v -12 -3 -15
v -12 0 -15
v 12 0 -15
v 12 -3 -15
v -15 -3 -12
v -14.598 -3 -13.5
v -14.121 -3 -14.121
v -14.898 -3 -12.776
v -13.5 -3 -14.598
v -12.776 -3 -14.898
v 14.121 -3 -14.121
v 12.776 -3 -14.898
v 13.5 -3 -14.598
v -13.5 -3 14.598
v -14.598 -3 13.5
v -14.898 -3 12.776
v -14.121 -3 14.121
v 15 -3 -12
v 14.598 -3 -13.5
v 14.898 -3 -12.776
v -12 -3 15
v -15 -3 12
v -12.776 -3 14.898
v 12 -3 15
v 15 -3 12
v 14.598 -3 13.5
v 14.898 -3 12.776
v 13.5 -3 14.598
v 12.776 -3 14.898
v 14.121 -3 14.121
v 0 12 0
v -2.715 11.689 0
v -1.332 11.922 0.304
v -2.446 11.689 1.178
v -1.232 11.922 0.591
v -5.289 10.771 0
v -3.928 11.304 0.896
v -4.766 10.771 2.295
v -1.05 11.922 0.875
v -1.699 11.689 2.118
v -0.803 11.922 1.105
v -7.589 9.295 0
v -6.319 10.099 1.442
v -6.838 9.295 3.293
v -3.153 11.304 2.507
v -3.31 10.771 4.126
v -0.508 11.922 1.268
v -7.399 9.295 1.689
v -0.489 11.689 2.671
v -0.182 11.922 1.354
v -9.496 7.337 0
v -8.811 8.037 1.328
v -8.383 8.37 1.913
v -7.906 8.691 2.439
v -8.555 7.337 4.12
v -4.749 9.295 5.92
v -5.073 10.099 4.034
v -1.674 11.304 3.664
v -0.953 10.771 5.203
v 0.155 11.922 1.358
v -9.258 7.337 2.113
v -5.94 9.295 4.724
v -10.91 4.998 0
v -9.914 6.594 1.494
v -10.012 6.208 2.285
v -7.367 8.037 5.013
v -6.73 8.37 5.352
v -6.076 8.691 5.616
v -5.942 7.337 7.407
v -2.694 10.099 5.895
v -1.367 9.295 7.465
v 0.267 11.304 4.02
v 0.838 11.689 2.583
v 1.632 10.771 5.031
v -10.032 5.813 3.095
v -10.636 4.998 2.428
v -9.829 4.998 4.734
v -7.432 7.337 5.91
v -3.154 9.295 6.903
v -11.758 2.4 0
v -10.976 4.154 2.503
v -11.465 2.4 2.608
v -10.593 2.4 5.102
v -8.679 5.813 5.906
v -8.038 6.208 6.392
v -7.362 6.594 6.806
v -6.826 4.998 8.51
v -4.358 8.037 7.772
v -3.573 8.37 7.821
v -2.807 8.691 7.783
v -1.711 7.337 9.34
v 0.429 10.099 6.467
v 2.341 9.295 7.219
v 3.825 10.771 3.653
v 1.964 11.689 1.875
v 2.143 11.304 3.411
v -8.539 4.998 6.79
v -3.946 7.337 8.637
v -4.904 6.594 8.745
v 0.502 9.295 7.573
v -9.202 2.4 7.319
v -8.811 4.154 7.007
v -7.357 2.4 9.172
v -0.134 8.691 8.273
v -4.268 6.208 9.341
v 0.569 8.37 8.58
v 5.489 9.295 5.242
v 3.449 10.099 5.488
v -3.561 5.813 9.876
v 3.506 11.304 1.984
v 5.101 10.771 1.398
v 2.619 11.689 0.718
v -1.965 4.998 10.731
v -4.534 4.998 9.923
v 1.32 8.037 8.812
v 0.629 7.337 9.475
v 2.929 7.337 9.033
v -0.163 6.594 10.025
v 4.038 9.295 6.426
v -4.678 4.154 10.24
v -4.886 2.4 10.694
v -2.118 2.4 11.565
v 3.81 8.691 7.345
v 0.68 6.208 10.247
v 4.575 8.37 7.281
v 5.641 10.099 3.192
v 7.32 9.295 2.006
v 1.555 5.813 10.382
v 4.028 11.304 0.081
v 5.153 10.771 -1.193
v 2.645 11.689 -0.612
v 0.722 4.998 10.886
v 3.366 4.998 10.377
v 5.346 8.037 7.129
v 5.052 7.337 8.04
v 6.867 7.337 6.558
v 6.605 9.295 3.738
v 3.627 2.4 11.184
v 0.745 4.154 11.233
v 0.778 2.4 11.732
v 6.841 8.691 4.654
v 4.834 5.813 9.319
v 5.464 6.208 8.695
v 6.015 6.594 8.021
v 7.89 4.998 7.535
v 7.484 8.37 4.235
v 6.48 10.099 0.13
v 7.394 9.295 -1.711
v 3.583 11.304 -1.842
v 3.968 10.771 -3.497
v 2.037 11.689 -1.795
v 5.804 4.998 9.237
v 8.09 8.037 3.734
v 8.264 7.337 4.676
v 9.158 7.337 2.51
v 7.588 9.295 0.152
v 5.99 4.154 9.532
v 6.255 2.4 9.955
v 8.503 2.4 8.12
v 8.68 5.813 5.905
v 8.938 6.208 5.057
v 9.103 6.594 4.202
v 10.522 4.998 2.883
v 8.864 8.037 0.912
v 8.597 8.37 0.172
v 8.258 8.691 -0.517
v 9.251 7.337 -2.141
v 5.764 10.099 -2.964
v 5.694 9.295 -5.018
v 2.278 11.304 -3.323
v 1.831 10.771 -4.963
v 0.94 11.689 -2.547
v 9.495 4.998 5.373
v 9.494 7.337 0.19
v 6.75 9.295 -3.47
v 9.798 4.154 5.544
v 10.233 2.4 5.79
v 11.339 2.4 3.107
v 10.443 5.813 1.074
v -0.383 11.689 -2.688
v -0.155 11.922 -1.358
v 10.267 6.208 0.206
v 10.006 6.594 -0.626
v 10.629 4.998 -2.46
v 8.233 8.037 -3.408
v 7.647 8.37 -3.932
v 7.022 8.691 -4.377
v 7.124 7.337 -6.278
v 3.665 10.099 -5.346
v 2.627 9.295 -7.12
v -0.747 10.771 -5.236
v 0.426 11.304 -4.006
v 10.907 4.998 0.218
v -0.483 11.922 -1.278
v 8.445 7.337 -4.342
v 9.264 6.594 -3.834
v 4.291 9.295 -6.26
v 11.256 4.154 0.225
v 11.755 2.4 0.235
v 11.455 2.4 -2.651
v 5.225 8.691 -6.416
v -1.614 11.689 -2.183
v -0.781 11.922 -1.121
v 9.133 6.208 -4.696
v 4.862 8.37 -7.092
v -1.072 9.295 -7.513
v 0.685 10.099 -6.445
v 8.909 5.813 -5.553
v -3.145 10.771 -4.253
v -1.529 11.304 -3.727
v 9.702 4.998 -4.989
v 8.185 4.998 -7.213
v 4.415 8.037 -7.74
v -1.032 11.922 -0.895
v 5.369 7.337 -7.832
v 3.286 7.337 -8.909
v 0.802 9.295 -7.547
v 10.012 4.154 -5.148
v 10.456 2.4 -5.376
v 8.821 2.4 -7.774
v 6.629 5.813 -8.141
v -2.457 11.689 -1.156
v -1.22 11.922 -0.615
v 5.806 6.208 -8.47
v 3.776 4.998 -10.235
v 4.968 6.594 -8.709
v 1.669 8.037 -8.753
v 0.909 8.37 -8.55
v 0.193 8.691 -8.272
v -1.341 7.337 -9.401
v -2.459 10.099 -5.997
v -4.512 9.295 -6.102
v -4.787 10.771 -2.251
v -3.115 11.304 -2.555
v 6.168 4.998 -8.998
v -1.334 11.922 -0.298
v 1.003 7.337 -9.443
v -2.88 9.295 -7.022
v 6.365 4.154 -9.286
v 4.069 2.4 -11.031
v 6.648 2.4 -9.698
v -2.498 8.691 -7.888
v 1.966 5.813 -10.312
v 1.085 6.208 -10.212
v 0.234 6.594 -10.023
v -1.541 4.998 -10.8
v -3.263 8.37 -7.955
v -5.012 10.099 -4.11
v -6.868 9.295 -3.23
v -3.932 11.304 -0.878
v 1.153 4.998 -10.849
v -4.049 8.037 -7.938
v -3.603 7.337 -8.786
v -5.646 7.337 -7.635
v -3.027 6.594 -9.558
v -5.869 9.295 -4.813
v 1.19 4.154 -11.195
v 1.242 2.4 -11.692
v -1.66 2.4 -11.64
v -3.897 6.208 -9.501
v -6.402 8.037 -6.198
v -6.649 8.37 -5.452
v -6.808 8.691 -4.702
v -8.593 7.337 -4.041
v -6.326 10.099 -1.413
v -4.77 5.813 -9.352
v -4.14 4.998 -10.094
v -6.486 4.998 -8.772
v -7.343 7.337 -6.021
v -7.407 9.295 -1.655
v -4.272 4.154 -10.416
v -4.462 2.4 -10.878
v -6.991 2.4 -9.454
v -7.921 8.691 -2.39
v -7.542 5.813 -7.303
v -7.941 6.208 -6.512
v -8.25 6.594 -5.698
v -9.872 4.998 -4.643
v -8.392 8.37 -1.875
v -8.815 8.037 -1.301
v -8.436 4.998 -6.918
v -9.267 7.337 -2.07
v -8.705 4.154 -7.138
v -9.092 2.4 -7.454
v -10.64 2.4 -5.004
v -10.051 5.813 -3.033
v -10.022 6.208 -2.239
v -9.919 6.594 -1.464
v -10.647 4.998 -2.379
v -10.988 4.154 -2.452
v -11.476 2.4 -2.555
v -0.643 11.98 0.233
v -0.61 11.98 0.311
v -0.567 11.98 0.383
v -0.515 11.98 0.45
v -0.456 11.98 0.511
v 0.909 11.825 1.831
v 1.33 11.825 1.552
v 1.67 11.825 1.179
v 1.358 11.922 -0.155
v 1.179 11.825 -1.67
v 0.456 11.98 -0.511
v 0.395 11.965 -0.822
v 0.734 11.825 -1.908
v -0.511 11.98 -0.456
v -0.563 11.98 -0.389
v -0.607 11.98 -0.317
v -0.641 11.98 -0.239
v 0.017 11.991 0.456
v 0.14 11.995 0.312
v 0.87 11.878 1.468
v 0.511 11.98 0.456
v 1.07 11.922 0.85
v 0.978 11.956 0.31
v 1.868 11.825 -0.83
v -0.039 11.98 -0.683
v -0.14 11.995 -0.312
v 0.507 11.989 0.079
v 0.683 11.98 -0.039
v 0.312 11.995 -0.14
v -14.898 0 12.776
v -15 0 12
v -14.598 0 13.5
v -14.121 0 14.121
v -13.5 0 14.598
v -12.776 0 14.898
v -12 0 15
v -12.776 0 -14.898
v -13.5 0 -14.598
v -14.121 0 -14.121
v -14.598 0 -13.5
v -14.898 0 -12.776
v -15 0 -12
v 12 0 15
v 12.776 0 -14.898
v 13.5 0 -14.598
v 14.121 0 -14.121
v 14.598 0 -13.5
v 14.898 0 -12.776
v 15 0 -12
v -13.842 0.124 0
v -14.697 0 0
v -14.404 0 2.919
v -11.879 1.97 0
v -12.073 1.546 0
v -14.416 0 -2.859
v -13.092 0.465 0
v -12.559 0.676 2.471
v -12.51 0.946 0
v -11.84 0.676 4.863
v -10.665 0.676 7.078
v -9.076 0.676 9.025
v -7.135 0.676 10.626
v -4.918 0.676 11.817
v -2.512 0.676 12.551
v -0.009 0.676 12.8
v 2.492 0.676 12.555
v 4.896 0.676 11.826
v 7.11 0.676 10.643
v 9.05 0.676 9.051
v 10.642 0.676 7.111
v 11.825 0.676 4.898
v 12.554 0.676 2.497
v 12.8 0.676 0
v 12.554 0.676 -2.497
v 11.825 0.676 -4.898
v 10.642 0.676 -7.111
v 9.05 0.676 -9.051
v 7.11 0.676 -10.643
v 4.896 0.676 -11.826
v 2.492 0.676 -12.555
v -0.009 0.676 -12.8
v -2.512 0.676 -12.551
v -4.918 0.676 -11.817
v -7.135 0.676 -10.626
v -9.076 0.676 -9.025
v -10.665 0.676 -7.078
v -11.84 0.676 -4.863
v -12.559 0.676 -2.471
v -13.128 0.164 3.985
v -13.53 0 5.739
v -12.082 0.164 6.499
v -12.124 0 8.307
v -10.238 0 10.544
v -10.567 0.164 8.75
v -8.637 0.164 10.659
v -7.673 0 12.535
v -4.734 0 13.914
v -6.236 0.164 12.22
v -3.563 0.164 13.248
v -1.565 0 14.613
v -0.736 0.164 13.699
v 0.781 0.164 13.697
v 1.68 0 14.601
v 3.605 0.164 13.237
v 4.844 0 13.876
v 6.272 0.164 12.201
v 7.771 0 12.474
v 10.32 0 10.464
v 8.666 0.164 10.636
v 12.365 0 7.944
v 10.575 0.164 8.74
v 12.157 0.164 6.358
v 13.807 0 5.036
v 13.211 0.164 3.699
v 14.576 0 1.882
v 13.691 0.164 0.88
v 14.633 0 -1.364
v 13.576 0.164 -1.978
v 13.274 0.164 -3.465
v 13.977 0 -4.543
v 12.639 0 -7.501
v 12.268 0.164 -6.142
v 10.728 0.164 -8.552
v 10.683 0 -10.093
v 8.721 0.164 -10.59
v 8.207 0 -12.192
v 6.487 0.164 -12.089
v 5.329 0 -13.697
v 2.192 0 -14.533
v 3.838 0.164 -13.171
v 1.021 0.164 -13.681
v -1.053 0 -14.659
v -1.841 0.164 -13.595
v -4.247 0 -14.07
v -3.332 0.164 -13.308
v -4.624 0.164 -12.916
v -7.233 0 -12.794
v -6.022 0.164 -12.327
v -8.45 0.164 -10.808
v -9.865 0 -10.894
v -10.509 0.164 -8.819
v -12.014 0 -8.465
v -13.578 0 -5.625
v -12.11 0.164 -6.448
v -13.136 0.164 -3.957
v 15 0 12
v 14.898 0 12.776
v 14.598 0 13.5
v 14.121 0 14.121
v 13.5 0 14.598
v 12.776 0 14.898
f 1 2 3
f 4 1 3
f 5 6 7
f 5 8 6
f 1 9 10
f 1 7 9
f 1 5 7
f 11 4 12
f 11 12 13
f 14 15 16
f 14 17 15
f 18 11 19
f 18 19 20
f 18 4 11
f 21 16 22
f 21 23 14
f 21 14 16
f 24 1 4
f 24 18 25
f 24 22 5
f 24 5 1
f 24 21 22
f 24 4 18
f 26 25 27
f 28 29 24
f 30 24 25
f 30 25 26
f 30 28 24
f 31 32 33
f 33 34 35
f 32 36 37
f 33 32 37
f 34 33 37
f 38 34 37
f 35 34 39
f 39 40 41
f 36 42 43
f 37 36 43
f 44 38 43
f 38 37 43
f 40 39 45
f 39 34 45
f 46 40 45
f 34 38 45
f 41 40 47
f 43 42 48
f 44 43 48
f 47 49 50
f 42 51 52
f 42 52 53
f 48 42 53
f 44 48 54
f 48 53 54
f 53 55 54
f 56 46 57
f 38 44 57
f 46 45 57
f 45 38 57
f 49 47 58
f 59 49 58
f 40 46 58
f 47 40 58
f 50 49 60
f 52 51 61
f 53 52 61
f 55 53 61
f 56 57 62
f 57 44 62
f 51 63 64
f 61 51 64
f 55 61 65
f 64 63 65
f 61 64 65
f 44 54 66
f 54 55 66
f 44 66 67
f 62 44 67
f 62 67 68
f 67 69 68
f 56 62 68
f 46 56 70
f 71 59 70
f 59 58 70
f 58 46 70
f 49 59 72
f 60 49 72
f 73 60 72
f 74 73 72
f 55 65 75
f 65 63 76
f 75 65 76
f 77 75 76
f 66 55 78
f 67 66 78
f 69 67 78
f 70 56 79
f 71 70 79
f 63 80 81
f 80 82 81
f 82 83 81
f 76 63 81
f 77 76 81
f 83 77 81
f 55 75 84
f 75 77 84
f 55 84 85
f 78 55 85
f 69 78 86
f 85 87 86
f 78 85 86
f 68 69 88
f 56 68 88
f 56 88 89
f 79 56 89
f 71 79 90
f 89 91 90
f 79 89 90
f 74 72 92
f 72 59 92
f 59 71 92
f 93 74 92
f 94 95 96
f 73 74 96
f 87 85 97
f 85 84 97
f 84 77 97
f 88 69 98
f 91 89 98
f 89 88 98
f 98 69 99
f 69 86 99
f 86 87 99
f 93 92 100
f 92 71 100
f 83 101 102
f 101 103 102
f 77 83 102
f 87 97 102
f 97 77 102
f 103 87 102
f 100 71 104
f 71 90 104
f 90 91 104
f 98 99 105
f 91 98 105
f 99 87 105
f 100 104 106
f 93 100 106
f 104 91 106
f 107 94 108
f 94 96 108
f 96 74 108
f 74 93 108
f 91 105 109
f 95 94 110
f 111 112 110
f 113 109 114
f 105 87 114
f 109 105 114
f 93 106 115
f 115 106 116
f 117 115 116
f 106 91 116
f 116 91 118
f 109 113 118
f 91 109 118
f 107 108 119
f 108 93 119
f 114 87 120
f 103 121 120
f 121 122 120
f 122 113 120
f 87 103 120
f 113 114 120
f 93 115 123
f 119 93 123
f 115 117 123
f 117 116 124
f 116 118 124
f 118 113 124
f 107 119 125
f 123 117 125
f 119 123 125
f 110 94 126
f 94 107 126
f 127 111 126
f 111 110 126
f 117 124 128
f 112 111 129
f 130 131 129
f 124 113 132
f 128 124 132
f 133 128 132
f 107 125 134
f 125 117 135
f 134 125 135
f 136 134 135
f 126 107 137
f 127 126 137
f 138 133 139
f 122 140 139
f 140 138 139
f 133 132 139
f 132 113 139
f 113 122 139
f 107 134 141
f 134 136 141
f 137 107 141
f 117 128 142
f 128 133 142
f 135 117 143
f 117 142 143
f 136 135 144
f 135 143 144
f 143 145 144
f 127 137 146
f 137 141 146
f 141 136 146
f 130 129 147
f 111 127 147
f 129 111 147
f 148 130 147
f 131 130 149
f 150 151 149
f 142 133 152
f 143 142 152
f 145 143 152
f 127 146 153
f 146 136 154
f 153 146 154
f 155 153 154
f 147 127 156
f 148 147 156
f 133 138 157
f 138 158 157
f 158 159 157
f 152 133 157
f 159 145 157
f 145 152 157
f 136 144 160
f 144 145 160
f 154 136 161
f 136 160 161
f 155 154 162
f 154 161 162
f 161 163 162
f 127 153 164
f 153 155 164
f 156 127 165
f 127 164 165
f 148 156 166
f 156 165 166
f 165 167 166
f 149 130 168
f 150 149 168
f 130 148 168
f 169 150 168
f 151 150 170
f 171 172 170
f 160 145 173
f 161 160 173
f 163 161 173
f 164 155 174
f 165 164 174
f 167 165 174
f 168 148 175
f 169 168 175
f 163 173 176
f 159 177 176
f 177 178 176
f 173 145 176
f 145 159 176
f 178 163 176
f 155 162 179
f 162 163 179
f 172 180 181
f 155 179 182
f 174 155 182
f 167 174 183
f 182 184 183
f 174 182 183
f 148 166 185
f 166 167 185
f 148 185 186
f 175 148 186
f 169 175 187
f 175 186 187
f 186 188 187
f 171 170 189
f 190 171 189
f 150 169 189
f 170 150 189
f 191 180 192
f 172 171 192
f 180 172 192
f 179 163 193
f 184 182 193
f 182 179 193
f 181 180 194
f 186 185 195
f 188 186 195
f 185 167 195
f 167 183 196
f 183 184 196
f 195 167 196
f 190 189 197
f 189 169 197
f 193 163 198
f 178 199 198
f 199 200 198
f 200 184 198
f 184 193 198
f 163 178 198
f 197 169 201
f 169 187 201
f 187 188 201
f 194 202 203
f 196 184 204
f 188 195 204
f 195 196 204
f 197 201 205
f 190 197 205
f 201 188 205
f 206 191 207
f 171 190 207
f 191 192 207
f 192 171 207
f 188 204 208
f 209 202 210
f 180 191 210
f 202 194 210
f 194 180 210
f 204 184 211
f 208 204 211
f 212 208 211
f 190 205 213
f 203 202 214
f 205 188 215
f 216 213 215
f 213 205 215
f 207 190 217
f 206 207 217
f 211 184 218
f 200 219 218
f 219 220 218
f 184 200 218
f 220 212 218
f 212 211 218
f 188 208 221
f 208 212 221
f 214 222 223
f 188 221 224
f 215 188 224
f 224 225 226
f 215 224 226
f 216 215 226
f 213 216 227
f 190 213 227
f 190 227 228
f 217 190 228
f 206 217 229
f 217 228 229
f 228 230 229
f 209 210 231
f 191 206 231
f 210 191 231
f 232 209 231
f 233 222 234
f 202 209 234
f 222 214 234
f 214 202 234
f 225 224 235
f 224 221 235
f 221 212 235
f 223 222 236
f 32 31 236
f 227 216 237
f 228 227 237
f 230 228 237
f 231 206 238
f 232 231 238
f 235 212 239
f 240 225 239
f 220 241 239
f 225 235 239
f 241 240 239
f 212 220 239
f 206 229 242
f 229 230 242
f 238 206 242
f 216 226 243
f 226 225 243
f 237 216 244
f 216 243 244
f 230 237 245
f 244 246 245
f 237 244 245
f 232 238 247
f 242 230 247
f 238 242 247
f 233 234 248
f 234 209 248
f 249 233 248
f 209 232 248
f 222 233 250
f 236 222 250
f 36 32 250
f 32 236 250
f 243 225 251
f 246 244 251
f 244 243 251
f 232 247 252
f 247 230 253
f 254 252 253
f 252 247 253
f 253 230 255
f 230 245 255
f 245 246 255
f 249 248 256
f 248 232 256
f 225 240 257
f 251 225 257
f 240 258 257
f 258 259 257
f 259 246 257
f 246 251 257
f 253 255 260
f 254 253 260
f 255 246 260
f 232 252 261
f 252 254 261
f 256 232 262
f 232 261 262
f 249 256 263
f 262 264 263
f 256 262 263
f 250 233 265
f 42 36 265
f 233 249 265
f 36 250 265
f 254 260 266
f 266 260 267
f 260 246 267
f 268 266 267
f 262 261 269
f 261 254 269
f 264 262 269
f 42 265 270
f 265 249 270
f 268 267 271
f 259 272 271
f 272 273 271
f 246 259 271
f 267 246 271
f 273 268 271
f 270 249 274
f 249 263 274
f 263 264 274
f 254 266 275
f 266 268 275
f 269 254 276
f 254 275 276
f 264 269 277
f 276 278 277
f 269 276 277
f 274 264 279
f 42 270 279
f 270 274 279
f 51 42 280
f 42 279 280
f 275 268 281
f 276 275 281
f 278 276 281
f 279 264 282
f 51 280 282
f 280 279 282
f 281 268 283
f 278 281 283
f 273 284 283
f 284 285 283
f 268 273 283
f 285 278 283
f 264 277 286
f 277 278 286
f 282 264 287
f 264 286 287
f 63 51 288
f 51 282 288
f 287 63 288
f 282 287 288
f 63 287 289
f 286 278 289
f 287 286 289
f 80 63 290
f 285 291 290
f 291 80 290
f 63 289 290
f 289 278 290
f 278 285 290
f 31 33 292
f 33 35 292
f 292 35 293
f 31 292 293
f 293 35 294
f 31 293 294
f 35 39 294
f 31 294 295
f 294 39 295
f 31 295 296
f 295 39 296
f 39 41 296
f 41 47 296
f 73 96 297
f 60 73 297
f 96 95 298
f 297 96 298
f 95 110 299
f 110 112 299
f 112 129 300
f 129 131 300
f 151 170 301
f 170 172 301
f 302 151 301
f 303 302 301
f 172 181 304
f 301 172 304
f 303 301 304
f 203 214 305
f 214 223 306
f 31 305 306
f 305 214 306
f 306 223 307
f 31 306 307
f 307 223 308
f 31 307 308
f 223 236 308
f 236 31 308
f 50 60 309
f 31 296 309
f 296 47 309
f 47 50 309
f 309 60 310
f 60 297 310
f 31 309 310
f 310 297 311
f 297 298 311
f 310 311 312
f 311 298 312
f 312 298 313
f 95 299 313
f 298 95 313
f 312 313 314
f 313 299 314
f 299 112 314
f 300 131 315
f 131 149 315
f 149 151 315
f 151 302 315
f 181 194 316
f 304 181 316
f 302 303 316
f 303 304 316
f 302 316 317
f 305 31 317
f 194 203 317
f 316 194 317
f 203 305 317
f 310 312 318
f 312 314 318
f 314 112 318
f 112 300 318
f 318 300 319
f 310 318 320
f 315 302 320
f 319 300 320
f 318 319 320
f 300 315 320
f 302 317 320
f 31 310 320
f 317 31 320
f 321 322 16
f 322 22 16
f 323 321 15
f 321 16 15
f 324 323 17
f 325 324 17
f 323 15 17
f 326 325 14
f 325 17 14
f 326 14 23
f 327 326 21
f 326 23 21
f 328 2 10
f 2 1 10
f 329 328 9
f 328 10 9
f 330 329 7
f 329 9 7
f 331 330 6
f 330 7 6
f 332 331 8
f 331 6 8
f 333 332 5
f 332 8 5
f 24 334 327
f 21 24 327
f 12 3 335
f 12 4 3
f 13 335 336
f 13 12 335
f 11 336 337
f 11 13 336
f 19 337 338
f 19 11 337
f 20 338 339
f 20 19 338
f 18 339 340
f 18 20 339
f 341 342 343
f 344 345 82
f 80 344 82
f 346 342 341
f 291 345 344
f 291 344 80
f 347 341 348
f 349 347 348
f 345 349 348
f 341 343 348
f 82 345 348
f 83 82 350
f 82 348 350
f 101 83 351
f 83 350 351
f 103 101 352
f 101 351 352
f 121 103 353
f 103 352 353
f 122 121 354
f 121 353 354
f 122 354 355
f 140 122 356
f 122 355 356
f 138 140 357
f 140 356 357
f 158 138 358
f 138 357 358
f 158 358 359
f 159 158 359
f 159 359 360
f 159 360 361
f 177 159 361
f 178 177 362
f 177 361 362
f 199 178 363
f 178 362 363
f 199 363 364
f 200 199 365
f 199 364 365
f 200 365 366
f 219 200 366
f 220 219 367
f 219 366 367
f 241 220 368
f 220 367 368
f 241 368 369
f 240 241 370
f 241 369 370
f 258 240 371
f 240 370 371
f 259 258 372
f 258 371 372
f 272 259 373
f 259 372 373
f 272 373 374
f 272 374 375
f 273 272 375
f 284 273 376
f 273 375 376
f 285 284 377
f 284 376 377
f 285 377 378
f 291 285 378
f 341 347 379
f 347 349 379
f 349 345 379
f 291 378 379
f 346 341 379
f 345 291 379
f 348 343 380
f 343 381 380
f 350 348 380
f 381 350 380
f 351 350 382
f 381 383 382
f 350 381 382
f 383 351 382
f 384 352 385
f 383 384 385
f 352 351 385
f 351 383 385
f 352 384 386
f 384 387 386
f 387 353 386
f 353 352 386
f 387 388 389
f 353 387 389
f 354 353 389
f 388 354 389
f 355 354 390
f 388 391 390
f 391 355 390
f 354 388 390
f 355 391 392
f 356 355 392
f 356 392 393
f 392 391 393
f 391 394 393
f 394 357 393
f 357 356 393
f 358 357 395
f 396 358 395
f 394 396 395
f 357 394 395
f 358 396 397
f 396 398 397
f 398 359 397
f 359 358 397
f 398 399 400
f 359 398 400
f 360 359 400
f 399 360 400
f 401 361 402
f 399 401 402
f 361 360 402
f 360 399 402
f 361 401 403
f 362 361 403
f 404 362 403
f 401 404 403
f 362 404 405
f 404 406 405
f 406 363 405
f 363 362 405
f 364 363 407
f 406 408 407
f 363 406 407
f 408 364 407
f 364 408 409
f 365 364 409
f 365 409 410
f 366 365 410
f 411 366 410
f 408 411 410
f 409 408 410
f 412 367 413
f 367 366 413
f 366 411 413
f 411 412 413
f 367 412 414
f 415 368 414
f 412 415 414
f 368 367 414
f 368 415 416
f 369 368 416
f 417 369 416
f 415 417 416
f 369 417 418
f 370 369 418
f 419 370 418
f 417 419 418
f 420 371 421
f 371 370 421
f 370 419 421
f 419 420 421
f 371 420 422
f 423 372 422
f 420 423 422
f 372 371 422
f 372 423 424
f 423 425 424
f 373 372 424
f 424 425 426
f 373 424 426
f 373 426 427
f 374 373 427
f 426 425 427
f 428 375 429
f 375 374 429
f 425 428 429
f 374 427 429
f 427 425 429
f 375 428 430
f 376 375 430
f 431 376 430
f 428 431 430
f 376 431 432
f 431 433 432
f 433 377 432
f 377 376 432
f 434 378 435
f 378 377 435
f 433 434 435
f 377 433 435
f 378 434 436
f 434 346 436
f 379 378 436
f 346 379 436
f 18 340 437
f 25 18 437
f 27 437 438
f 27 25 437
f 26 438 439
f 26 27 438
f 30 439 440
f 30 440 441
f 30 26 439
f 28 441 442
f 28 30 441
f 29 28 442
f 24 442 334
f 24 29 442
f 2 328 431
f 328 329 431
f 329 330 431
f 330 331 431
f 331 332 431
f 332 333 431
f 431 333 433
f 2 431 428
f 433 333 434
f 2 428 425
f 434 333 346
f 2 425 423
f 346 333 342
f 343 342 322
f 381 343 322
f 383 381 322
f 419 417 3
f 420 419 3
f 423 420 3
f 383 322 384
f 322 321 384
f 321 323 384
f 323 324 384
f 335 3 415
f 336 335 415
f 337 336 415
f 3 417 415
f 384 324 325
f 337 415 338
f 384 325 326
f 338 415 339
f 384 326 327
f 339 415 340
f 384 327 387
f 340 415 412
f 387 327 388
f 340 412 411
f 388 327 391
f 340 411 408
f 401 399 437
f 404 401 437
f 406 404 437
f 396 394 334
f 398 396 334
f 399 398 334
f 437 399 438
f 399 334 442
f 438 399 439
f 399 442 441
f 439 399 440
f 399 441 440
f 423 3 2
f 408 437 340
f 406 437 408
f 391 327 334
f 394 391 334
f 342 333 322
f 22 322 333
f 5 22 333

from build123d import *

# Parameters (mm, degrees)
F2_W     = 15
F2_H     = 15
F3_DEPTH = 3
F4_R     = 3


with BuildPart() as f1:
    # F0 (on Top) → F1 (revolve)
    with BuildSketch(Plane.XY):
        with BuildLine():
            Line((-12, 0), (0, 0))
            Line((0, 0), (0, 12))
            ThreePointArc((0, 12), (-8.485281, 8.485281), (-12, 0))
        make_face()
    revolve(axis=Axis((0, 6, 0), (0, 1, 0)))

    # F2 (on Front) → F3 (join)
    with BuildSketch(Plane.XZ):
        with Locations((-7.5, -7.5)):
            Rectangle(F2_W, F2_H)
        Polygon((14.947975, 0), (0, 0), (0, -15), (15, -15), (15, 0), align=None)
        Polygon((-15, 0), (0, 0), (14.947975, 0), (15, 0), (15, 15), (-15, 15), align=None)
    extrude(amount=F3_DEPTH)

    # F4
    f4_edges = [f1.edges().sort_by_distance(p)[0] for p in [
        (15, -1.5, 15),
        (15, -1.5, -15),
        (-15, -1.5, -15),
        (-15, -1.5, 15),
        (12, 0, 0),
    ]]
    fillet(f4_edges, radius=F4_R)


solid = f1.part
